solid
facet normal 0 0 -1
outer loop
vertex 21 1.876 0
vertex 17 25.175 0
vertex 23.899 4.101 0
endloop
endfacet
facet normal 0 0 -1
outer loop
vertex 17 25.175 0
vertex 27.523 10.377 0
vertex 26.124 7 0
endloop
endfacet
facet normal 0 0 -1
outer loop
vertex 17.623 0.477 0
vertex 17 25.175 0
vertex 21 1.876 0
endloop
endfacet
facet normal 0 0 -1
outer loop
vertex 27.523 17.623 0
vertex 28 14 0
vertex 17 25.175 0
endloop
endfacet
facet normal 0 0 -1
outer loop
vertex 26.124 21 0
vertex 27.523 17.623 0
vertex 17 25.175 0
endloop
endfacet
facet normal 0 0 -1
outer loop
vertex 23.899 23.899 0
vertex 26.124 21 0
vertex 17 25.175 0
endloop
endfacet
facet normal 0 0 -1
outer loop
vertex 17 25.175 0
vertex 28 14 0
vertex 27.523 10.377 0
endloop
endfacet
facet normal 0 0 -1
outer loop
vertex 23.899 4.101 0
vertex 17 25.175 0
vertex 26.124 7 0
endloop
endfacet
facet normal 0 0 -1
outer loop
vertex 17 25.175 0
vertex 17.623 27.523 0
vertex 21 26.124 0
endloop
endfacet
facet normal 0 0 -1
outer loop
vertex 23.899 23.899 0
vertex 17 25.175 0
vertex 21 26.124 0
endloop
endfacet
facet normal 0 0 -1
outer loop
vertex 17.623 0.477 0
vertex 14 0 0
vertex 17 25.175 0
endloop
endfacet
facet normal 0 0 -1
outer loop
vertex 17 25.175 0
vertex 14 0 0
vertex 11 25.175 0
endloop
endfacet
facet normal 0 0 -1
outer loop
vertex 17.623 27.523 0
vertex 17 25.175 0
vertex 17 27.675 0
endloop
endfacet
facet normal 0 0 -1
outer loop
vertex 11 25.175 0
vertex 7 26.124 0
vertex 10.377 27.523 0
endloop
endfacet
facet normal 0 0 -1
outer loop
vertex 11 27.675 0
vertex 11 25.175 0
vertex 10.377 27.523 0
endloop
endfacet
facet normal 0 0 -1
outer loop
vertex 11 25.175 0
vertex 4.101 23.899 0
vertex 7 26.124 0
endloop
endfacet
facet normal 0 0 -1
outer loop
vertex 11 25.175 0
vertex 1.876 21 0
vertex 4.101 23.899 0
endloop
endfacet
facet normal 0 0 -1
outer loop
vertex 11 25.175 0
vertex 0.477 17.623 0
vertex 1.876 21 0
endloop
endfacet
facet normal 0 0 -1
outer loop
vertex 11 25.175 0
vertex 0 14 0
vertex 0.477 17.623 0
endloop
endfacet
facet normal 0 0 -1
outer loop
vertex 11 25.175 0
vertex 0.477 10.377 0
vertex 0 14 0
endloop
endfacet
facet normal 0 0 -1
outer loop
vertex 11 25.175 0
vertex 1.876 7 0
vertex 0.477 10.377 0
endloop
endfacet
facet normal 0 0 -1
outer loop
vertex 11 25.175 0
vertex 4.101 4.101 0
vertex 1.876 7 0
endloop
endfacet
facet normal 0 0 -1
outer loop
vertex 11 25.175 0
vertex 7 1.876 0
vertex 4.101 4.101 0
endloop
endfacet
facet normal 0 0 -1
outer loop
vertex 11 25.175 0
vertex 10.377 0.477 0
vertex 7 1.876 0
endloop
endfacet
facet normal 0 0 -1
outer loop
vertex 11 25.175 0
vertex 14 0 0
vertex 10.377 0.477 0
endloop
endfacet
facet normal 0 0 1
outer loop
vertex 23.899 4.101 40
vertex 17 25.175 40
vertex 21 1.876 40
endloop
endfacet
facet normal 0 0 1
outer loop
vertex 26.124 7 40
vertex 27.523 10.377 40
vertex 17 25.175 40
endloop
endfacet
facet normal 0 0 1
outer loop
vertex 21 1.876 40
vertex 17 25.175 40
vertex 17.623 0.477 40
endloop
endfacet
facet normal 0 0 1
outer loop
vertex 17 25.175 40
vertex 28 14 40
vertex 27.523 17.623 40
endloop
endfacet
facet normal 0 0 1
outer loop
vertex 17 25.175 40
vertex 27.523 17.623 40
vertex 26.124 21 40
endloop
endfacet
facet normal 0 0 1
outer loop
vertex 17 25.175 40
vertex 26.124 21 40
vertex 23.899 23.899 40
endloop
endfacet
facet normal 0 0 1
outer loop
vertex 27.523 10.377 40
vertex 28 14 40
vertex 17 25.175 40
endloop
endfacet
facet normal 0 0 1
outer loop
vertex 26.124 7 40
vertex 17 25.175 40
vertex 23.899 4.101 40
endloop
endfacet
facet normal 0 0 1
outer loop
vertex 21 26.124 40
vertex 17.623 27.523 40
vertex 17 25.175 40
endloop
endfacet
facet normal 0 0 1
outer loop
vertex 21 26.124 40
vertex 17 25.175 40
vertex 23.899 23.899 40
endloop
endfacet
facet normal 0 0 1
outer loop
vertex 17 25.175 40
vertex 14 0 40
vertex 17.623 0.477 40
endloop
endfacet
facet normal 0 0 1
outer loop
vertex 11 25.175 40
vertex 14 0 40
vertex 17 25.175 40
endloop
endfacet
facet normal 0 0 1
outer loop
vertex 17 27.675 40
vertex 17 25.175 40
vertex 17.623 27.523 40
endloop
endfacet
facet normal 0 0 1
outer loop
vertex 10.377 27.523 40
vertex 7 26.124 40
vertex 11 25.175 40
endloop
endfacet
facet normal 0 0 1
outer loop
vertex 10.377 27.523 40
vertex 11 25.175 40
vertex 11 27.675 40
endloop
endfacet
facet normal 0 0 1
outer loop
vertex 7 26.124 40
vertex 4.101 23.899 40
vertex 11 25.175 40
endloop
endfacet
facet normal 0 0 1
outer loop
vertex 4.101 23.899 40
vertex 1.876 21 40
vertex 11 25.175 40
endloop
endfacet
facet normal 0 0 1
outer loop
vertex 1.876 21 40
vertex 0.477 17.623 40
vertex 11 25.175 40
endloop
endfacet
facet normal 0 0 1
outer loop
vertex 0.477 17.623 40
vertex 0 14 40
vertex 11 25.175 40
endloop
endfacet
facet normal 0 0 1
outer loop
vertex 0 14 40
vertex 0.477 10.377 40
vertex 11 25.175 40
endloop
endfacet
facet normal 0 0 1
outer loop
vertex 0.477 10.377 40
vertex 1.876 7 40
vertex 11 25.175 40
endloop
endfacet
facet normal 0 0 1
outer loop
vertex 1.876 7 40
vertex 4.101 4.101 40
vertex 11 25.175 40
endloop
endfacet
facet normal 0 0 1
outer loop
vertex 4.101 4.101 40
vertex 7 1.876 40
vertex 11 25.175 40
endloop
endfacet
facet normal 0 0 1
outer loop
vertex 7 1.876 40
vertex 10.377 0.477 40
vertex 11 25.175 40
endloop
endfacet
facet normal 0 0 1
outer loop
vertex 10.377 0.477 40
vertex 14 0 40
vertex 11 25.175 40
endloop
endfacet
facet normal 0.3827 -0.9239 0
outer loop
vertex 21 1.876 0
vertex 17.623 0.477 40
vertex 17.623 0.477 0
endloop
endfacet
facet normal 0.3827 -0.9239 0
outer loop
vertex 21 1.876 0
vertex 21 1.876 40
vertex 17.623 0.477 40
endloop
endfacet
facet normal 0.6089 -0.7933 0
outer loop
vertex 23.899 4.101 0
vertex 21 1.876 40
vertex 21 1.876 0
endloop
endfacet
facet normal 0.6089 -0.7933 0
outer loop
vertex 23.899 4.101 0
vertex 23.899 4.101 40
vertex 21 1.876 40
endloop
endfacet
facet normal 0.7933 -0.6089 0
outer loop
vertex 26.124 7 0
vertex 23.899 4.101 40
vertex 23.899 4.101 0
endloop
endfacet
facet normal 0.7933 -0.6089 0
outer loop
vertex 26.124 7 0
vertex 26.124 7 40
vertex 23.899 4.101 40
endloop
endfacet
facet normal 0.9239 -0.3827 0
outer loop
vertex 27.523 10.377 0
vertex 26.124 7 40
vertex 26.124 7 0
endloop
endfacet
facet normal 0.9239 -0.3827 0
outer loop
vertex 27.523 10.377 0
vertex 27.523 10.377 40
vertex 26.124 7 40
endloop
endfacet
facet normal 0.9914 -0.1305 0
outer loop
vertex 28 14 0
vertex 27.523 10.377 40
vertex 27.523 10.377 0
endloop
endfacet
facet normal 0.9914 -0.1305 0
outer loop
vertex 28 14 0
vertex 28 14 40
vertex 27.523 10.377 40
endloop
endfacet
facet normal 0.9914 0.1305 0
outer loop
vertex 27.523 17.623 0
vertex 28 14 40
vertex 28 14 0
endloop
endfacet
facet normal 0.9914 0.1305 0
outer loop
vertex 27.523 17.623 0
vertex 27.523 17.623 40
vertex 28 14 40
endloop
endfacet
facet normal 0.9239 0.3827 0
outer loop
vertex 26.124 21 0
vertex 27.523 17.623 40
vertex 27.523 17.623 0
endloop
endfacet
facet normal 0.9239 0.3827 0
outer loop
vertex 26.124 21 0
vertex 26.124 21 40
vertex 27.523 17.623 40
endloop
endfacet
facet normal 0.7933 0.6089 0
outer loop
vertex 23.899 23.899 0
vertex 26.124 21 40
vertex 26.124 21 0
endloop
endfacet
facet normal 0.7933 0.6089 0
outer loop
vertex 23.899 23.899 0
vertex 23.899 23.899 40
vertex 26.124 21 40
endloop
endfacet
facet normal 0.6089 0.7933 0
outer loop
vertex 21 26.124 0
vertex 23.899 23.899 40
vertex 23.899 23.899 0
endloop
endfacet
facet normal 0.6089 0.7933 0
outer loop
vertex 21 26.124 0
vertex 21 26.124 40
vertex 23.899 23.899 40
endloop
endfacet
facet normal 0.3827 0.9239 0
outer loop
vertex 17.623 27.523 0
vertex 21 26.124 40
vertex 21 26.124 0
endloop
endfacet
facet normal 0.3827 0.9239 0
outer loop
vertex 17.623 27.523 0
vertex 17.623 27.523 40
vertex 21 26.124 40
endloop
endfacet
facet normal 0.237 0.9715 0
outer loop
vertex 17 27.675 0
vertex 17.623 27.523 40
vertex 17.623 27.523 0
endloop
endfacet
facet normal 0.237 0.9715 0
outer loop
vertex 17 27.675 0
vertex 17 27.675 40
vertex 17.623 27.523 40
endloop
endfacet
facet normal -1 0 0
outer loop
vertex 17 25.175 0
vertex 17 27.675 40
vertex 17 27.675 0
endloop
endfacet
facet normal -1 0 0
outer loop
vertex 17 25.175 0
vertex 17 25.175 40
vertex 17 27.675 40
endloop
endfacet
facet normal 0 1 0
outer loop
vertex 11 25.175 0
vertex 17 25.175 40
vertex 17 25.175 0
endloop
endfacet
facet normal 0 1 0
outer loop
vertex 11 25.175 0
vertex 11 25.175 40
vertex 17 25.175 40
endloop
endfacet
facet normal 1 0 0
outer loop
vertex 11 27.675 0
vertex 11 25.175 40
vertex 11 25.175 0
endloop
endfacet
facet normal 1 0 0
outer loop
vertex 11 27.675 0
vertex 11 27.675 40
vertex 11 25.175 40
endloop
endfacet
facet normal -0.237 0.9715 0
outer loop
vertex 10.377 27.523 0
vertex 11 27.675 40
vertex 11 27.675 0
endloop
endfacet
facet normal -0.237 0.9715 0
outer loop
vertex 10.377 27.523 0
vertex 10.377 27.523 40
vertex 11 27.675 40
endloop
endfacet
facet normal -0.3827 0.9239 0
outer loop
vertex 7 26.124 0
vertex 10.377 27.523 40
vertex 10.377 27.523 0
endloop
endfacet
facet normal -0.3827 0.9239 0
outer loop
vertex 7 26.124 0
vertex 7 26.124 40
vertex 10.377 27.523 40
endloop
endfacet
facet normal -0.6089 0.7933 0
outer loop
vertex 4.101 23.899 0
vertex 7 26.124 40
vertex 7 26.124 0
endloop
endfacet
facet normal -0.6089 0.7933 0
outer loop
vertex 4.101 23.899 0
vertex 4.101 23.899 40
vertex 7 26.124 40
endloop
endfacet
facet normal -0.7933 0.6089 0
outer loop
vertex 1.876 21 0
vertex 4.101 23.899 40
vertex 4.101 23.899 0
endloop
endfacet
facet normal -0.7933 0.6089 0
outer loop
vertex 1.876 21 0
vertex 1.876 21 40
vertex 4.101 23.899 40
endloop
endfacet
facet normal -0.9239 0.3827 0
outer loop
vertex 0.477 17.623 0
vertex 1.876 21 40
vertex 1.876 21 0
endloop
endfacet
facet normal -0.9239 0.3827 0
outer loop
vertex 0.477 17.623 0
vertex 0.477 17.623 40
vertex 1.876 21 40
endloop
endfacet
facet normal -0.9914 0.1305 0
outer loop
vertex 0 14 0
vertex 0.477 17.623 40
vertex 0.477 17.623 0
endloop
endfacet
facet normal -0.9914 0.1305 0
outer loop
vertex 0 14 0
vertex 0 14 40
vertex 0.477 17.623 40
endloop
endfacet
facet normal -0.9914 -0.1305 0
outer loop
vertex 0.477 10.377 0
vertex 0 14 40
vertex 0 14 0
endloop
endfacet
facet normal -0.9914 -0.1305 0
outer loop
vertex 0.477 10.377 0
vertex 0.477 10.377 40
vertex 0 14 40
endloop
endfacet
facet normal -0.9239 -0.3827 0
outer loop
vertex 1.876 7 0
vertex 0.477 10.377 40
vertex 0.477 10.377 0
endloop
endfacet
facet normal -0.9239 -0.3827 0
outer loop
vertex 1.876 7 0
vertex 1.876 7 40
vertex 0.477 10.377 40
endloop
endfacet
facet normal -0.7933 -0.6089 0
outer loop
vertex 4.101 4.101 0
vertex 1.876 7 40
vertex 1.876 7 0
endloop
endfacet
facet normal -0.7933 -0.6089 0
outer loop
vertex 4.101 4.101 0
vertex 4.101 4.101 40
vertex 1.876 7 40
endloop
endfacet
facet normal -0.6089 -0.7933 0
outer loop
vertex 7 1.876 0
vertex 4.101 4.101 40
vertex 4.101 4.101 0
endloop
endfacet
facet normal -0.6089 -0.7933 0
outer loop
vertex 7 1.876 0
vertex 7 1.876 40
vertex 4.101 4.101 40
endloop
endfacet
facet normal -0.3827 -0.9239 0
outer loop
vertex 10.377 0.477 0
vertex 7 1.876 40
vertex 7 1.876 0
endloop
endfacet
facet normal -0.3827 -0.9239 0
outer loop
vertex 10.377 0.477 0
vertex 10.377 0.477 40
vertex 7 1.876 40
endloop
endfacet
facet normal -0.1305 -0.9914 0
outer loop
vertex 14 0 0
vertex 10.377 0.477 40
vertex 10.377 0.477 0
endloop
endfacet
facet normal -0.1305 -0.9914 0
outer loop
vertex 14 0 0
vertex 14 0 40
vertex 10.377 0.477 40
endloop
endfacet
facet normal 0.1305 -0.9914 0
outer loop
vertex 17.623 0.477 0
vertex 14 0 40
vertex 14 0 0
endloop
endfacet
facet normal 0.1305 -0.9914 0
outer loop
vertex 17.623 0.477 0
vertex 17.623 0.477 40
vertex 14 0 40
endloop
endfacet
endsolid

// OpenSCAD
$fn = 32;

// ----------------------------------------------------------------------
// Keyway shaft: d28 shaft, key 6 x 2.5 mm
// ----------------------------------------------------------------------

// --- parameters (mm) ---
shaft_r = 14;             // shaft radius
key_w = 6;                // keyway width
key_d = 2.5;              // keyway depth below the surface line
plate_t = 40;             // shaft length, Z (extrusion height)
fit_tol = 0.1;            // declared fit tolerance (prompt contract)
free_tol = 0.5;           // declared free tolerance (prompt contract)

shaft_d = 2 * shaft_r;  // shaft diameter
circle_step = 15;  // polygon sampling step, degrees

profile = [[10.377, 27.523], [7, 26.124], [4.101, 23.899], [1.876, 21], [0.477, 17.623], [0, 14], [0.477, 10.377], [1.876, 7], [4.101, 4.101], [7, 1.876], [10.377, 0.477], [14, 0], [17.623, 0.477], [21, 1.876], [23.899, 4.101], [26.124, 7], [27.523, 10.377], [28, 14], [27.523, 17.623], [26.124, 21], [23.899, 23.899], [21, 26.124], [17.623, 27.523], [17, 27.675], [17, 25.175], [11, 25.175], [11, 27.675]];  // primary outline, 27 points, counter clockwise

// --- the one profile operation ---
linear_extrude(height = plate_t) polygon(points = profile);
